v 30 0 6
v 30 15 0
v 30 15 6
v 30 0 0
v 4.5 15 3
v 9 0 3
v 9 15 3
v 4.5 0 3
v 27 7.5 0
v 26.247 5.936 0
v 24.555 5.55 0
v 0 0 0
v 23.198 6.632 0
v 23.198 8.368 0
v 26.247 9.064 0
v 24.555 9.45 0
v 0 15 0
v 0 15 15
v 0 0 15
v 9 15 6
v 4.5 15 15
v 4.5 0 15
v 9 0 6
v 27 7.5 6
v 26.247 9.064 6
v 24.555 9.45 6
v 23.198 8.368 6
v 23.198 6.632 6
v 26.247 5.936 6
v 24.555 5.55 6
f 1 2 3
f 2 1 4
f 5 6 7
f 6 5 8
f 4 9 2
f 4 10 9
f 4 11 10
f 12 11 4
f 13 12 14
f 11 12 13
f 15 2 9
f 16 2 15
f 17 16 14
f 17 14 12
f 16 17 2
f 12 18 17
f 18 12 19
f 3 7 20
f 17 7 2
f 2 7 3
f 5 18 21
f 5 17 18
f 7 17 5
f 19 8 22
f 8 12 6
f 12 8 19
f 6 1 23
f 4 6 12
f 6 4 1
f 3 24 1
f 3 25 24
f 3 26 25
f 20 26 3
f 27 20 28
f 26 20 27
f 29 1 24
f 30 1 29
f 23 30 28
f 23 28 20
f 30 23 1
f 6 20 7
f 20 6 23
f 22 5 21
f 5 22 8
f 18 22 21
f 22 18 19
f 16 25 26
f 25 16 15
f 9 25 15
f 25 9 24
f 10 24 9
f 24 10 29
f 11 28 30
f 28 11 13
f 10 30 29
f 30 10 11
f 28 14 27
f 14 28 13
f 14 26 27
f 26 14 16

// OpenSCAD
l1 = 30;
l2 = 15;
w = 15;
d = 3;

h = 2;

difference(){
    union() {
cube([l1,w,d]);
translate([d*3,0,d]) cube([l1-d*3,w,d]);

cube([d*1.5,w,l2]);
    }
translate([l1-5,w/2,0]) cylinder(d*2,h,h);
//translate([0,w/2,l2-5]) rotate([0,90,0])cylinder(d,h,h);

}
